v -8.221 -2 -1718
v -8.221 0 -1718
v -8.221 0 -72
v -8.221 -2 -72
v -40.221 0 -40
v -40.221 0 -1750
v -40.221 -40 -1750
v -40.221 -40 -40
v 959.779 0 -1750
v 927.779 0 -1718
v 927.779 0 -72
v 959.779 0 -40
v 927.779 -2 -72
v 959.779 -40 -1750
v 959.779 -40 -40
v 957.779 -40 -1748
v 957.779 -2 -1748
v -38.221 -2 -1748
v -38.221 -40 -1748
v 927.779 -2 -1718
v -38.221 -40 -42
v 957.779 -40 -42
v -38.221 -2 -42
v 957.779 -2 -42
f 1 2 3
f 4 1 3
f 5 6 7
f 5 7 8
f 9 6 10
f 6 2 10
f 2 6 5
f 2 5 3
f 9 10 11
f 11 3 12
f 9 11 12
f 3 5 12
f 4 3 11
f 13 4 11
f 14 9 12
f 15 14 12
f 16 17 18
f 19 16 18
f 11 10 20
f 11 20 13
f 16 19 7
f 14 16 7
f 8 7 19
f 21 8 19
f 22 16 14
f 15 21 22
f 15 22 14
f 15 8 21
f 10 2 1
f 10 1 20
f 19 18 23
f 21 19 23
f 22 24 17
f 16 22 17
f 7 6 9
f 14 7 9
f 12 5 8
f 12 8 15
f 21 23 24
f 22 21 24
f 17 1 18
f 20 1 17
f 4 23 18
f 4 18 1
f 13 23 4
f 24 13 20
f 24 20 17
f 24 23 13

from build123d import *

# Parameters (mm, degrees)
F0_W     = 1000
F0_H     = 1710
F1_DEPTH = 40
F0_W_2   = 30
F0_H_2   = 30
F0_W_3   = 936
F0_H_3   = 1646
F2_DEPTH = 2


with BuildPart() as f1:
    # F0 (on Front) → F1 (new body)
    with BuildSketch(Plane.XZ):
        with Locations((459.7794299543, -895)):
            Rectangle(F0_W, F0_H)
        Polygon((-38.2205700457, -72), (-38.2205700457, -42), (-8.2205700457, -42), (927.7794299543, -42), (957.7794299543, -42), (957.7794299543, -72), (957.7794299543, -1718), (957.7794299543, -1748), (927.7794299543, -1748), (-8.2205700457, -1748), (-38.2205700457, -1748), (-38.2205700457, -1718), align=None, mode=Mode.SUBTRACT)
    extrude(amount=F1_DEPTH)

    # F0 (on Front) → F2 (join)
    with BuildSketch(Plane.XZ):
        with Locations((942.7794299543, -57)):
            Rectangle(F0_W_2, F0_H_2)
        with Locations((459.7794299543, -57)):
            Rectangle(F0_W_3, F0_H_2)
        with Locations((942.7794299543, -895)):
            Rectangle(F0_W_2, F0_H_3)
        with Locations((-23.2205700457, -57)):
            Rectangle(F0_W_2, F0_H_2)
        with Locations((-23.2205700457, -895)):
            Rectangle(F0_W_2, F0_H_3)
        with Locations((-23.2205700457, -1733)):
            Rectangle(F0_W_2, F0_H_2)
        with Locations((459.7794299543, -1733)):
            Rectangle(F0_W_3, F0_H_2)
        with Locations((942.7794299543, -1733)):
            Rectangle(F0_W_2, F0_H_2)
    extrude(amount=F2_DEPTH)


solid = f1.part
